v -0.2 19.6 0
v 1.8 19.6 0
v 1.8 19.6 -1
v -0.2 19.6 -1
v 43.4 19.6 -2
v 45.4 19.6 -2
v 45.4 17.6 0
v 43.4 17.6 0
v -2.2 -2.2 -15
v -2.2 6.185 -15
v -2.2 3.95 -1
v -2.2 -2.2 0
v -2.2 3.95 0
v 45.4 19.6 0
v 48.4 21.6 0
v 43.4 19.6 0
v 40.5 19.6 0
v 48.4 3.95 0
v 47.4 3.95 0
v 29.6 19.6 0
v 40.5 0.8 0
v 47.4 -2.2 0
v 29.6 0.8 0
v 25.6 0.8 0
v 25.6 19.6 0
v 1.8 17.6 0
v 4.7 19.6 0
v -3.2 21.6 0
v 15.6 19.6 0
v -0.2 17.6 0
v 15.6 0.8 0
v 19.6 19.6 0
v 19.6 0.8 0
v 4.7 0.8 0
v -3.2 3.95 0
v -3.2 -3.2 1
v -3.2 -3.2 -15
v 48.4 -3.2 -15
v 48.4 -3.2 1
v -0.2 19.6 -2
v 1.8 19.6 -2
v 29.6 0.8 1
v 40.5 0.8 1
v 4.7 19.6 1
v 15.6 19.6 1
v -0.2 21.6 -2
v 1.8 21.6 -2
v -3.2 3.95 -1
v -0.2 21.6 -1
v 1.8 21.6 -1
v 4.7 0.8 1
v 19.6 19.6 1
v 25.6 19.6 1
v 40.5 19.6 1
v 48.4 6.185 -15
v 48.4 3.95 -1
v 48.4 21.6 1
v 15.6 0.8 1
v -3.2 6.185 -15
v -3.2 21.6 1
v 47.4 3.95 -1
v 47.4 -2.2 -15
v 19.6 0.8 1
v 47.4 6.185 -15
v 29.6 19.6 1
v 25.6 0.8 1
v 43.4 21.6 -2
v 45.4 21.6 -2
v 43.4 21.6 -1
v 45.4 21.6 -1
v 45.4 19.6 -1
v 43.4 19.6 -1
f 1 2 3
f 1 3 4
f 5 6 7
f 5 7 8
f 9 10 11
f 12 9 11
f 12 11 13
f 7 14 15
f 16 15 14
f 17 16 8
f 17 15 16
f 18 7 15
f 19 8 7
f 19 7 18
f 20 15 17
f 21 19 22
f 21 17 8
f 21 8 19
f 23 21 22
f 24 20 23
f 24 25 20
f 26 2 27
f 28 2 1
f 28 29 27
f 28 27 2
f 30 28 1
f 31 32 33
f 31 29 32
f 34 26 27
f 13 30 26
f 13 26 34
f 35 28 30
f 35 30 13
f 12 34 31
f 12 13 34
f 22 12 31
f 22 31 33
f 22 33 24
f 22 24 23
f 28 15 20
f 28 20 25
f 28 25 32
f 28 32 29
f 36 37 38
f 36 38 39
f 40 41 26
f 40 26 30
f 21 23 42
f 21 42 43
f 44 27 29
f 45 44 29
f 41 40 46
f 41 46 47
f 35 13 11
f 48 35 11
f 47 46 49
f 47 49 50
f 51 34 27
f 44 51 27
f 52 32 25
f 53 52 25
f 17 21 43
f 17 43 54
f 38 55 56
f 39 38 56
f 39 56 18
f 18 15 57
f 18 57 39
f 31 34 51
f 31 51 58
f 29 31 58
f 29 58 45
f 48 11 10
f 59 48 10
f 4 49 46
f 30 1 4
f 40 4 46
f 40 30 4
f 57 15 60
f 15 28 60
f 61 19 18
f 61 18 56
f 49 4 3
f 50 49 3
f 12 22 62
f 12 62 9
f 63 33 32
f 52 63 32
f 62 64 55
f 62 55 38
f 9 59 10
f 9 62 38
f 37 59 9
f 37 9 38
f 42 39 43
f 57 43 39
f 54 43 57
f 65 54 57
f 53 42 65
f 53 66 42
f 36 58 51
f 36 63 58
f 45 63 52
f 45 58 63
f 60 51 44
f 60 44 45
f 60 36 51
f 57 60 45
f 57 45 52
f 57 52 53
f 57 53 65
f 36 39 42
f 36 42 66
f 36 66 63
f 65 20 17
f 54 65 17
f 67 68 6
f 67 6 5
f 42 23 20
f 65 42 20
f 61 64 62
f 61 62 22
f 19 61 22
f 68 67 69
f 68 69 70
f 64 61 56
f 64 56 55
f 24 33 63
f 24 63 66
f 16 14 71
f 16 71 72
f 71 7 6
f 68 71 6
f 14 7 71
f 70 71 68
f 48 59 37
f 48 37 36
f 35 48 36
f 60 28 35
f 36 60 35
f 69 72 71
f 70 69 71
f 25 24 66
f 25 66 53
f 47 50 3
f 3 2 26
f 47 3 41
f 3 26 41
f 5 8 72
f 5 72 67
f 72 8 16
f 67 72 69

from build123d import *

# Parameters (mm, degrees)
SKETCH_2_W      = 49.600012207
SKETCH_2_H      = 22.800017408
SKETCH_2_W_2    = 10.900003052
SKETCH_2_H_2    = 18.800017408
SKETCH_2_W_3    = 6
SKETCH_2_W_4    = 10.900003051
EXTRUDE_1_DEPTH = 1
SKETCH_4_W      = 49.600012207
SKETCH_4_H      = 1
EXTRUDE_2_DEPTH = 2
SKETCH_5_W      = 49.600012207
SKETCH_5_H      = 1
EXTRUDE_3_DEPTH = 15
SKETCH_6_W      = 1
SKETCH_6_H      = 17.650008704
EXTRUDE_6_DEPTH = 1
SKETCH_7_W      = 2
SKETCH_7_H      = 2
EXTRUDE_7_DEPTH = 2
SKETCH_8_W      = 2
SKETCH_8_H      = 1
EXTRUDE_8_DEPTH = 2
CHAMFER_1_SIZE  = 2


with BuildPart() as part:
    # Эскиз2 → Бобышка-Вытянуть1 (new body)
    with BuildSketch(Plane.XY):
        with Locations((22.600006104, 10.200008704)):
            Rectangle(SKETCH_2_W, SKETCH_2_H)
        with Locations((10.150004578, 10.200008704)):
            Rectangle(SKETCH_2_W_2, SKETCH_2_H_2, mode=Mode.SUBTRACT)
        with Locations((22.600006104, 10.200008704)):
            Rectangle(SKETCH_2_W_3, SKETCH_2_H_2, mode=Mode.SUBTRACT)
        with Locations((35.05000763, 10.200008704)):
            Rectangle(SKETCH_2_W_4, SKETCH_2_H_2, mode=Mode.SUBTRACT)
    extrude(amount=EXTRUDE_1_DEPTH)

    # Эскиз4 → Бобышка-Вытянуть2 (add)
    with BuildSketch(Plane.XZ.offset(1.2)):
        with Locations((22.600006104, 0.5)):
            Rectangle(SKETCH_4_W, SKETCH_4_H)
    extrude(amount=EXTRUDE_2_DEPTH)

    # Эскиз5 → Бобышка-Вытянуть3 (add)
    with BuildSketch(Plane(origin=(0, 0, 0), x_dir=(-1, 0, 0), z_dir=(0, 0, -1))):
        with Locations((-22.600006104, -2.7)):
            Rectangle(SKETCH_5_W, SKETCH_5_H)
    extrude(amount=EXTRUDE_3_DEPTH)

    # Эскиз6 → Бобышка-Вытянуть6 (add)
    with BuildSketch(Plane.ZY.offset(2.2)):
        with Locations((0.5, 12.775013056)):
            Rectangle(SKETCH_6_W, SKETCH_6_H)
        Polygon((1, 3.950008704), (0, 3.950008704), (0, -2.2), (-15, -2.2), (-15, -3.2), (1, -3.2), align=None)
        Polygon((0, -2.2), (0, 3.950008704), (-1, 3.950008704), (-15, 6.184703554), (-15, -2.2), align=None)
    extrude_6 = extrude(amount=EXTRUDE_6_DEPTH)

    # Зеркальное отражение1: Бобышка-Вытянуть6 across plane
    add(extrude_6.mirror(Plane.ZY.offset(-22.600006104)))

    # Эскиз7 → Бобышка-Вытянуть7 (add)
    with BuildSketch(Plane(origin=(0, 0, 0), x_dir=(-1, 0, 0), z_dir=(0, 0, -1))):
        with Locations((-44.400012207, 18.600017408)):
            Rectangle(SKETCH_7_W, SKETCH_7_H)
        with Locations((-0.8, 18.600017408)):
            Rectangle(SKETCH_7_W, SKETCH_7_H)
    extrude(amount=EXTRUDE_7_DEPTH)

    # Эскиз8 → Бобышка-Вытянуть8 (add)
    with BuildSketch(Plane(origin=(0, 19.600017408, 0), x_dir=(1, 0, 0), z_dir=(0, 1, 0))):
        with Locations((0.8, 1.5)):
            Rectangle(SKETCH_8_W, SKETCH_8_H)
        with Locations((44.400012207, 1.5)):
            Rectangle(SKETCH_8_W, SKETCH_8_H)
    extrude(amount=EXTRUDE_8_DEPTH)

    # Фаска1
    chamfer_1_edges = [part.edges().sort_by_distance(p)[0] for p in [
        (0.8, 17.600017408, -2),
        (44.400012207, 17.600017408, -2),
    ]]
    chamfer(chamfer_1_edges, length=CHAMFER_1_SIZE - 0.0001)  # a hair under: the kernel refuses the full size


solid = part.part
